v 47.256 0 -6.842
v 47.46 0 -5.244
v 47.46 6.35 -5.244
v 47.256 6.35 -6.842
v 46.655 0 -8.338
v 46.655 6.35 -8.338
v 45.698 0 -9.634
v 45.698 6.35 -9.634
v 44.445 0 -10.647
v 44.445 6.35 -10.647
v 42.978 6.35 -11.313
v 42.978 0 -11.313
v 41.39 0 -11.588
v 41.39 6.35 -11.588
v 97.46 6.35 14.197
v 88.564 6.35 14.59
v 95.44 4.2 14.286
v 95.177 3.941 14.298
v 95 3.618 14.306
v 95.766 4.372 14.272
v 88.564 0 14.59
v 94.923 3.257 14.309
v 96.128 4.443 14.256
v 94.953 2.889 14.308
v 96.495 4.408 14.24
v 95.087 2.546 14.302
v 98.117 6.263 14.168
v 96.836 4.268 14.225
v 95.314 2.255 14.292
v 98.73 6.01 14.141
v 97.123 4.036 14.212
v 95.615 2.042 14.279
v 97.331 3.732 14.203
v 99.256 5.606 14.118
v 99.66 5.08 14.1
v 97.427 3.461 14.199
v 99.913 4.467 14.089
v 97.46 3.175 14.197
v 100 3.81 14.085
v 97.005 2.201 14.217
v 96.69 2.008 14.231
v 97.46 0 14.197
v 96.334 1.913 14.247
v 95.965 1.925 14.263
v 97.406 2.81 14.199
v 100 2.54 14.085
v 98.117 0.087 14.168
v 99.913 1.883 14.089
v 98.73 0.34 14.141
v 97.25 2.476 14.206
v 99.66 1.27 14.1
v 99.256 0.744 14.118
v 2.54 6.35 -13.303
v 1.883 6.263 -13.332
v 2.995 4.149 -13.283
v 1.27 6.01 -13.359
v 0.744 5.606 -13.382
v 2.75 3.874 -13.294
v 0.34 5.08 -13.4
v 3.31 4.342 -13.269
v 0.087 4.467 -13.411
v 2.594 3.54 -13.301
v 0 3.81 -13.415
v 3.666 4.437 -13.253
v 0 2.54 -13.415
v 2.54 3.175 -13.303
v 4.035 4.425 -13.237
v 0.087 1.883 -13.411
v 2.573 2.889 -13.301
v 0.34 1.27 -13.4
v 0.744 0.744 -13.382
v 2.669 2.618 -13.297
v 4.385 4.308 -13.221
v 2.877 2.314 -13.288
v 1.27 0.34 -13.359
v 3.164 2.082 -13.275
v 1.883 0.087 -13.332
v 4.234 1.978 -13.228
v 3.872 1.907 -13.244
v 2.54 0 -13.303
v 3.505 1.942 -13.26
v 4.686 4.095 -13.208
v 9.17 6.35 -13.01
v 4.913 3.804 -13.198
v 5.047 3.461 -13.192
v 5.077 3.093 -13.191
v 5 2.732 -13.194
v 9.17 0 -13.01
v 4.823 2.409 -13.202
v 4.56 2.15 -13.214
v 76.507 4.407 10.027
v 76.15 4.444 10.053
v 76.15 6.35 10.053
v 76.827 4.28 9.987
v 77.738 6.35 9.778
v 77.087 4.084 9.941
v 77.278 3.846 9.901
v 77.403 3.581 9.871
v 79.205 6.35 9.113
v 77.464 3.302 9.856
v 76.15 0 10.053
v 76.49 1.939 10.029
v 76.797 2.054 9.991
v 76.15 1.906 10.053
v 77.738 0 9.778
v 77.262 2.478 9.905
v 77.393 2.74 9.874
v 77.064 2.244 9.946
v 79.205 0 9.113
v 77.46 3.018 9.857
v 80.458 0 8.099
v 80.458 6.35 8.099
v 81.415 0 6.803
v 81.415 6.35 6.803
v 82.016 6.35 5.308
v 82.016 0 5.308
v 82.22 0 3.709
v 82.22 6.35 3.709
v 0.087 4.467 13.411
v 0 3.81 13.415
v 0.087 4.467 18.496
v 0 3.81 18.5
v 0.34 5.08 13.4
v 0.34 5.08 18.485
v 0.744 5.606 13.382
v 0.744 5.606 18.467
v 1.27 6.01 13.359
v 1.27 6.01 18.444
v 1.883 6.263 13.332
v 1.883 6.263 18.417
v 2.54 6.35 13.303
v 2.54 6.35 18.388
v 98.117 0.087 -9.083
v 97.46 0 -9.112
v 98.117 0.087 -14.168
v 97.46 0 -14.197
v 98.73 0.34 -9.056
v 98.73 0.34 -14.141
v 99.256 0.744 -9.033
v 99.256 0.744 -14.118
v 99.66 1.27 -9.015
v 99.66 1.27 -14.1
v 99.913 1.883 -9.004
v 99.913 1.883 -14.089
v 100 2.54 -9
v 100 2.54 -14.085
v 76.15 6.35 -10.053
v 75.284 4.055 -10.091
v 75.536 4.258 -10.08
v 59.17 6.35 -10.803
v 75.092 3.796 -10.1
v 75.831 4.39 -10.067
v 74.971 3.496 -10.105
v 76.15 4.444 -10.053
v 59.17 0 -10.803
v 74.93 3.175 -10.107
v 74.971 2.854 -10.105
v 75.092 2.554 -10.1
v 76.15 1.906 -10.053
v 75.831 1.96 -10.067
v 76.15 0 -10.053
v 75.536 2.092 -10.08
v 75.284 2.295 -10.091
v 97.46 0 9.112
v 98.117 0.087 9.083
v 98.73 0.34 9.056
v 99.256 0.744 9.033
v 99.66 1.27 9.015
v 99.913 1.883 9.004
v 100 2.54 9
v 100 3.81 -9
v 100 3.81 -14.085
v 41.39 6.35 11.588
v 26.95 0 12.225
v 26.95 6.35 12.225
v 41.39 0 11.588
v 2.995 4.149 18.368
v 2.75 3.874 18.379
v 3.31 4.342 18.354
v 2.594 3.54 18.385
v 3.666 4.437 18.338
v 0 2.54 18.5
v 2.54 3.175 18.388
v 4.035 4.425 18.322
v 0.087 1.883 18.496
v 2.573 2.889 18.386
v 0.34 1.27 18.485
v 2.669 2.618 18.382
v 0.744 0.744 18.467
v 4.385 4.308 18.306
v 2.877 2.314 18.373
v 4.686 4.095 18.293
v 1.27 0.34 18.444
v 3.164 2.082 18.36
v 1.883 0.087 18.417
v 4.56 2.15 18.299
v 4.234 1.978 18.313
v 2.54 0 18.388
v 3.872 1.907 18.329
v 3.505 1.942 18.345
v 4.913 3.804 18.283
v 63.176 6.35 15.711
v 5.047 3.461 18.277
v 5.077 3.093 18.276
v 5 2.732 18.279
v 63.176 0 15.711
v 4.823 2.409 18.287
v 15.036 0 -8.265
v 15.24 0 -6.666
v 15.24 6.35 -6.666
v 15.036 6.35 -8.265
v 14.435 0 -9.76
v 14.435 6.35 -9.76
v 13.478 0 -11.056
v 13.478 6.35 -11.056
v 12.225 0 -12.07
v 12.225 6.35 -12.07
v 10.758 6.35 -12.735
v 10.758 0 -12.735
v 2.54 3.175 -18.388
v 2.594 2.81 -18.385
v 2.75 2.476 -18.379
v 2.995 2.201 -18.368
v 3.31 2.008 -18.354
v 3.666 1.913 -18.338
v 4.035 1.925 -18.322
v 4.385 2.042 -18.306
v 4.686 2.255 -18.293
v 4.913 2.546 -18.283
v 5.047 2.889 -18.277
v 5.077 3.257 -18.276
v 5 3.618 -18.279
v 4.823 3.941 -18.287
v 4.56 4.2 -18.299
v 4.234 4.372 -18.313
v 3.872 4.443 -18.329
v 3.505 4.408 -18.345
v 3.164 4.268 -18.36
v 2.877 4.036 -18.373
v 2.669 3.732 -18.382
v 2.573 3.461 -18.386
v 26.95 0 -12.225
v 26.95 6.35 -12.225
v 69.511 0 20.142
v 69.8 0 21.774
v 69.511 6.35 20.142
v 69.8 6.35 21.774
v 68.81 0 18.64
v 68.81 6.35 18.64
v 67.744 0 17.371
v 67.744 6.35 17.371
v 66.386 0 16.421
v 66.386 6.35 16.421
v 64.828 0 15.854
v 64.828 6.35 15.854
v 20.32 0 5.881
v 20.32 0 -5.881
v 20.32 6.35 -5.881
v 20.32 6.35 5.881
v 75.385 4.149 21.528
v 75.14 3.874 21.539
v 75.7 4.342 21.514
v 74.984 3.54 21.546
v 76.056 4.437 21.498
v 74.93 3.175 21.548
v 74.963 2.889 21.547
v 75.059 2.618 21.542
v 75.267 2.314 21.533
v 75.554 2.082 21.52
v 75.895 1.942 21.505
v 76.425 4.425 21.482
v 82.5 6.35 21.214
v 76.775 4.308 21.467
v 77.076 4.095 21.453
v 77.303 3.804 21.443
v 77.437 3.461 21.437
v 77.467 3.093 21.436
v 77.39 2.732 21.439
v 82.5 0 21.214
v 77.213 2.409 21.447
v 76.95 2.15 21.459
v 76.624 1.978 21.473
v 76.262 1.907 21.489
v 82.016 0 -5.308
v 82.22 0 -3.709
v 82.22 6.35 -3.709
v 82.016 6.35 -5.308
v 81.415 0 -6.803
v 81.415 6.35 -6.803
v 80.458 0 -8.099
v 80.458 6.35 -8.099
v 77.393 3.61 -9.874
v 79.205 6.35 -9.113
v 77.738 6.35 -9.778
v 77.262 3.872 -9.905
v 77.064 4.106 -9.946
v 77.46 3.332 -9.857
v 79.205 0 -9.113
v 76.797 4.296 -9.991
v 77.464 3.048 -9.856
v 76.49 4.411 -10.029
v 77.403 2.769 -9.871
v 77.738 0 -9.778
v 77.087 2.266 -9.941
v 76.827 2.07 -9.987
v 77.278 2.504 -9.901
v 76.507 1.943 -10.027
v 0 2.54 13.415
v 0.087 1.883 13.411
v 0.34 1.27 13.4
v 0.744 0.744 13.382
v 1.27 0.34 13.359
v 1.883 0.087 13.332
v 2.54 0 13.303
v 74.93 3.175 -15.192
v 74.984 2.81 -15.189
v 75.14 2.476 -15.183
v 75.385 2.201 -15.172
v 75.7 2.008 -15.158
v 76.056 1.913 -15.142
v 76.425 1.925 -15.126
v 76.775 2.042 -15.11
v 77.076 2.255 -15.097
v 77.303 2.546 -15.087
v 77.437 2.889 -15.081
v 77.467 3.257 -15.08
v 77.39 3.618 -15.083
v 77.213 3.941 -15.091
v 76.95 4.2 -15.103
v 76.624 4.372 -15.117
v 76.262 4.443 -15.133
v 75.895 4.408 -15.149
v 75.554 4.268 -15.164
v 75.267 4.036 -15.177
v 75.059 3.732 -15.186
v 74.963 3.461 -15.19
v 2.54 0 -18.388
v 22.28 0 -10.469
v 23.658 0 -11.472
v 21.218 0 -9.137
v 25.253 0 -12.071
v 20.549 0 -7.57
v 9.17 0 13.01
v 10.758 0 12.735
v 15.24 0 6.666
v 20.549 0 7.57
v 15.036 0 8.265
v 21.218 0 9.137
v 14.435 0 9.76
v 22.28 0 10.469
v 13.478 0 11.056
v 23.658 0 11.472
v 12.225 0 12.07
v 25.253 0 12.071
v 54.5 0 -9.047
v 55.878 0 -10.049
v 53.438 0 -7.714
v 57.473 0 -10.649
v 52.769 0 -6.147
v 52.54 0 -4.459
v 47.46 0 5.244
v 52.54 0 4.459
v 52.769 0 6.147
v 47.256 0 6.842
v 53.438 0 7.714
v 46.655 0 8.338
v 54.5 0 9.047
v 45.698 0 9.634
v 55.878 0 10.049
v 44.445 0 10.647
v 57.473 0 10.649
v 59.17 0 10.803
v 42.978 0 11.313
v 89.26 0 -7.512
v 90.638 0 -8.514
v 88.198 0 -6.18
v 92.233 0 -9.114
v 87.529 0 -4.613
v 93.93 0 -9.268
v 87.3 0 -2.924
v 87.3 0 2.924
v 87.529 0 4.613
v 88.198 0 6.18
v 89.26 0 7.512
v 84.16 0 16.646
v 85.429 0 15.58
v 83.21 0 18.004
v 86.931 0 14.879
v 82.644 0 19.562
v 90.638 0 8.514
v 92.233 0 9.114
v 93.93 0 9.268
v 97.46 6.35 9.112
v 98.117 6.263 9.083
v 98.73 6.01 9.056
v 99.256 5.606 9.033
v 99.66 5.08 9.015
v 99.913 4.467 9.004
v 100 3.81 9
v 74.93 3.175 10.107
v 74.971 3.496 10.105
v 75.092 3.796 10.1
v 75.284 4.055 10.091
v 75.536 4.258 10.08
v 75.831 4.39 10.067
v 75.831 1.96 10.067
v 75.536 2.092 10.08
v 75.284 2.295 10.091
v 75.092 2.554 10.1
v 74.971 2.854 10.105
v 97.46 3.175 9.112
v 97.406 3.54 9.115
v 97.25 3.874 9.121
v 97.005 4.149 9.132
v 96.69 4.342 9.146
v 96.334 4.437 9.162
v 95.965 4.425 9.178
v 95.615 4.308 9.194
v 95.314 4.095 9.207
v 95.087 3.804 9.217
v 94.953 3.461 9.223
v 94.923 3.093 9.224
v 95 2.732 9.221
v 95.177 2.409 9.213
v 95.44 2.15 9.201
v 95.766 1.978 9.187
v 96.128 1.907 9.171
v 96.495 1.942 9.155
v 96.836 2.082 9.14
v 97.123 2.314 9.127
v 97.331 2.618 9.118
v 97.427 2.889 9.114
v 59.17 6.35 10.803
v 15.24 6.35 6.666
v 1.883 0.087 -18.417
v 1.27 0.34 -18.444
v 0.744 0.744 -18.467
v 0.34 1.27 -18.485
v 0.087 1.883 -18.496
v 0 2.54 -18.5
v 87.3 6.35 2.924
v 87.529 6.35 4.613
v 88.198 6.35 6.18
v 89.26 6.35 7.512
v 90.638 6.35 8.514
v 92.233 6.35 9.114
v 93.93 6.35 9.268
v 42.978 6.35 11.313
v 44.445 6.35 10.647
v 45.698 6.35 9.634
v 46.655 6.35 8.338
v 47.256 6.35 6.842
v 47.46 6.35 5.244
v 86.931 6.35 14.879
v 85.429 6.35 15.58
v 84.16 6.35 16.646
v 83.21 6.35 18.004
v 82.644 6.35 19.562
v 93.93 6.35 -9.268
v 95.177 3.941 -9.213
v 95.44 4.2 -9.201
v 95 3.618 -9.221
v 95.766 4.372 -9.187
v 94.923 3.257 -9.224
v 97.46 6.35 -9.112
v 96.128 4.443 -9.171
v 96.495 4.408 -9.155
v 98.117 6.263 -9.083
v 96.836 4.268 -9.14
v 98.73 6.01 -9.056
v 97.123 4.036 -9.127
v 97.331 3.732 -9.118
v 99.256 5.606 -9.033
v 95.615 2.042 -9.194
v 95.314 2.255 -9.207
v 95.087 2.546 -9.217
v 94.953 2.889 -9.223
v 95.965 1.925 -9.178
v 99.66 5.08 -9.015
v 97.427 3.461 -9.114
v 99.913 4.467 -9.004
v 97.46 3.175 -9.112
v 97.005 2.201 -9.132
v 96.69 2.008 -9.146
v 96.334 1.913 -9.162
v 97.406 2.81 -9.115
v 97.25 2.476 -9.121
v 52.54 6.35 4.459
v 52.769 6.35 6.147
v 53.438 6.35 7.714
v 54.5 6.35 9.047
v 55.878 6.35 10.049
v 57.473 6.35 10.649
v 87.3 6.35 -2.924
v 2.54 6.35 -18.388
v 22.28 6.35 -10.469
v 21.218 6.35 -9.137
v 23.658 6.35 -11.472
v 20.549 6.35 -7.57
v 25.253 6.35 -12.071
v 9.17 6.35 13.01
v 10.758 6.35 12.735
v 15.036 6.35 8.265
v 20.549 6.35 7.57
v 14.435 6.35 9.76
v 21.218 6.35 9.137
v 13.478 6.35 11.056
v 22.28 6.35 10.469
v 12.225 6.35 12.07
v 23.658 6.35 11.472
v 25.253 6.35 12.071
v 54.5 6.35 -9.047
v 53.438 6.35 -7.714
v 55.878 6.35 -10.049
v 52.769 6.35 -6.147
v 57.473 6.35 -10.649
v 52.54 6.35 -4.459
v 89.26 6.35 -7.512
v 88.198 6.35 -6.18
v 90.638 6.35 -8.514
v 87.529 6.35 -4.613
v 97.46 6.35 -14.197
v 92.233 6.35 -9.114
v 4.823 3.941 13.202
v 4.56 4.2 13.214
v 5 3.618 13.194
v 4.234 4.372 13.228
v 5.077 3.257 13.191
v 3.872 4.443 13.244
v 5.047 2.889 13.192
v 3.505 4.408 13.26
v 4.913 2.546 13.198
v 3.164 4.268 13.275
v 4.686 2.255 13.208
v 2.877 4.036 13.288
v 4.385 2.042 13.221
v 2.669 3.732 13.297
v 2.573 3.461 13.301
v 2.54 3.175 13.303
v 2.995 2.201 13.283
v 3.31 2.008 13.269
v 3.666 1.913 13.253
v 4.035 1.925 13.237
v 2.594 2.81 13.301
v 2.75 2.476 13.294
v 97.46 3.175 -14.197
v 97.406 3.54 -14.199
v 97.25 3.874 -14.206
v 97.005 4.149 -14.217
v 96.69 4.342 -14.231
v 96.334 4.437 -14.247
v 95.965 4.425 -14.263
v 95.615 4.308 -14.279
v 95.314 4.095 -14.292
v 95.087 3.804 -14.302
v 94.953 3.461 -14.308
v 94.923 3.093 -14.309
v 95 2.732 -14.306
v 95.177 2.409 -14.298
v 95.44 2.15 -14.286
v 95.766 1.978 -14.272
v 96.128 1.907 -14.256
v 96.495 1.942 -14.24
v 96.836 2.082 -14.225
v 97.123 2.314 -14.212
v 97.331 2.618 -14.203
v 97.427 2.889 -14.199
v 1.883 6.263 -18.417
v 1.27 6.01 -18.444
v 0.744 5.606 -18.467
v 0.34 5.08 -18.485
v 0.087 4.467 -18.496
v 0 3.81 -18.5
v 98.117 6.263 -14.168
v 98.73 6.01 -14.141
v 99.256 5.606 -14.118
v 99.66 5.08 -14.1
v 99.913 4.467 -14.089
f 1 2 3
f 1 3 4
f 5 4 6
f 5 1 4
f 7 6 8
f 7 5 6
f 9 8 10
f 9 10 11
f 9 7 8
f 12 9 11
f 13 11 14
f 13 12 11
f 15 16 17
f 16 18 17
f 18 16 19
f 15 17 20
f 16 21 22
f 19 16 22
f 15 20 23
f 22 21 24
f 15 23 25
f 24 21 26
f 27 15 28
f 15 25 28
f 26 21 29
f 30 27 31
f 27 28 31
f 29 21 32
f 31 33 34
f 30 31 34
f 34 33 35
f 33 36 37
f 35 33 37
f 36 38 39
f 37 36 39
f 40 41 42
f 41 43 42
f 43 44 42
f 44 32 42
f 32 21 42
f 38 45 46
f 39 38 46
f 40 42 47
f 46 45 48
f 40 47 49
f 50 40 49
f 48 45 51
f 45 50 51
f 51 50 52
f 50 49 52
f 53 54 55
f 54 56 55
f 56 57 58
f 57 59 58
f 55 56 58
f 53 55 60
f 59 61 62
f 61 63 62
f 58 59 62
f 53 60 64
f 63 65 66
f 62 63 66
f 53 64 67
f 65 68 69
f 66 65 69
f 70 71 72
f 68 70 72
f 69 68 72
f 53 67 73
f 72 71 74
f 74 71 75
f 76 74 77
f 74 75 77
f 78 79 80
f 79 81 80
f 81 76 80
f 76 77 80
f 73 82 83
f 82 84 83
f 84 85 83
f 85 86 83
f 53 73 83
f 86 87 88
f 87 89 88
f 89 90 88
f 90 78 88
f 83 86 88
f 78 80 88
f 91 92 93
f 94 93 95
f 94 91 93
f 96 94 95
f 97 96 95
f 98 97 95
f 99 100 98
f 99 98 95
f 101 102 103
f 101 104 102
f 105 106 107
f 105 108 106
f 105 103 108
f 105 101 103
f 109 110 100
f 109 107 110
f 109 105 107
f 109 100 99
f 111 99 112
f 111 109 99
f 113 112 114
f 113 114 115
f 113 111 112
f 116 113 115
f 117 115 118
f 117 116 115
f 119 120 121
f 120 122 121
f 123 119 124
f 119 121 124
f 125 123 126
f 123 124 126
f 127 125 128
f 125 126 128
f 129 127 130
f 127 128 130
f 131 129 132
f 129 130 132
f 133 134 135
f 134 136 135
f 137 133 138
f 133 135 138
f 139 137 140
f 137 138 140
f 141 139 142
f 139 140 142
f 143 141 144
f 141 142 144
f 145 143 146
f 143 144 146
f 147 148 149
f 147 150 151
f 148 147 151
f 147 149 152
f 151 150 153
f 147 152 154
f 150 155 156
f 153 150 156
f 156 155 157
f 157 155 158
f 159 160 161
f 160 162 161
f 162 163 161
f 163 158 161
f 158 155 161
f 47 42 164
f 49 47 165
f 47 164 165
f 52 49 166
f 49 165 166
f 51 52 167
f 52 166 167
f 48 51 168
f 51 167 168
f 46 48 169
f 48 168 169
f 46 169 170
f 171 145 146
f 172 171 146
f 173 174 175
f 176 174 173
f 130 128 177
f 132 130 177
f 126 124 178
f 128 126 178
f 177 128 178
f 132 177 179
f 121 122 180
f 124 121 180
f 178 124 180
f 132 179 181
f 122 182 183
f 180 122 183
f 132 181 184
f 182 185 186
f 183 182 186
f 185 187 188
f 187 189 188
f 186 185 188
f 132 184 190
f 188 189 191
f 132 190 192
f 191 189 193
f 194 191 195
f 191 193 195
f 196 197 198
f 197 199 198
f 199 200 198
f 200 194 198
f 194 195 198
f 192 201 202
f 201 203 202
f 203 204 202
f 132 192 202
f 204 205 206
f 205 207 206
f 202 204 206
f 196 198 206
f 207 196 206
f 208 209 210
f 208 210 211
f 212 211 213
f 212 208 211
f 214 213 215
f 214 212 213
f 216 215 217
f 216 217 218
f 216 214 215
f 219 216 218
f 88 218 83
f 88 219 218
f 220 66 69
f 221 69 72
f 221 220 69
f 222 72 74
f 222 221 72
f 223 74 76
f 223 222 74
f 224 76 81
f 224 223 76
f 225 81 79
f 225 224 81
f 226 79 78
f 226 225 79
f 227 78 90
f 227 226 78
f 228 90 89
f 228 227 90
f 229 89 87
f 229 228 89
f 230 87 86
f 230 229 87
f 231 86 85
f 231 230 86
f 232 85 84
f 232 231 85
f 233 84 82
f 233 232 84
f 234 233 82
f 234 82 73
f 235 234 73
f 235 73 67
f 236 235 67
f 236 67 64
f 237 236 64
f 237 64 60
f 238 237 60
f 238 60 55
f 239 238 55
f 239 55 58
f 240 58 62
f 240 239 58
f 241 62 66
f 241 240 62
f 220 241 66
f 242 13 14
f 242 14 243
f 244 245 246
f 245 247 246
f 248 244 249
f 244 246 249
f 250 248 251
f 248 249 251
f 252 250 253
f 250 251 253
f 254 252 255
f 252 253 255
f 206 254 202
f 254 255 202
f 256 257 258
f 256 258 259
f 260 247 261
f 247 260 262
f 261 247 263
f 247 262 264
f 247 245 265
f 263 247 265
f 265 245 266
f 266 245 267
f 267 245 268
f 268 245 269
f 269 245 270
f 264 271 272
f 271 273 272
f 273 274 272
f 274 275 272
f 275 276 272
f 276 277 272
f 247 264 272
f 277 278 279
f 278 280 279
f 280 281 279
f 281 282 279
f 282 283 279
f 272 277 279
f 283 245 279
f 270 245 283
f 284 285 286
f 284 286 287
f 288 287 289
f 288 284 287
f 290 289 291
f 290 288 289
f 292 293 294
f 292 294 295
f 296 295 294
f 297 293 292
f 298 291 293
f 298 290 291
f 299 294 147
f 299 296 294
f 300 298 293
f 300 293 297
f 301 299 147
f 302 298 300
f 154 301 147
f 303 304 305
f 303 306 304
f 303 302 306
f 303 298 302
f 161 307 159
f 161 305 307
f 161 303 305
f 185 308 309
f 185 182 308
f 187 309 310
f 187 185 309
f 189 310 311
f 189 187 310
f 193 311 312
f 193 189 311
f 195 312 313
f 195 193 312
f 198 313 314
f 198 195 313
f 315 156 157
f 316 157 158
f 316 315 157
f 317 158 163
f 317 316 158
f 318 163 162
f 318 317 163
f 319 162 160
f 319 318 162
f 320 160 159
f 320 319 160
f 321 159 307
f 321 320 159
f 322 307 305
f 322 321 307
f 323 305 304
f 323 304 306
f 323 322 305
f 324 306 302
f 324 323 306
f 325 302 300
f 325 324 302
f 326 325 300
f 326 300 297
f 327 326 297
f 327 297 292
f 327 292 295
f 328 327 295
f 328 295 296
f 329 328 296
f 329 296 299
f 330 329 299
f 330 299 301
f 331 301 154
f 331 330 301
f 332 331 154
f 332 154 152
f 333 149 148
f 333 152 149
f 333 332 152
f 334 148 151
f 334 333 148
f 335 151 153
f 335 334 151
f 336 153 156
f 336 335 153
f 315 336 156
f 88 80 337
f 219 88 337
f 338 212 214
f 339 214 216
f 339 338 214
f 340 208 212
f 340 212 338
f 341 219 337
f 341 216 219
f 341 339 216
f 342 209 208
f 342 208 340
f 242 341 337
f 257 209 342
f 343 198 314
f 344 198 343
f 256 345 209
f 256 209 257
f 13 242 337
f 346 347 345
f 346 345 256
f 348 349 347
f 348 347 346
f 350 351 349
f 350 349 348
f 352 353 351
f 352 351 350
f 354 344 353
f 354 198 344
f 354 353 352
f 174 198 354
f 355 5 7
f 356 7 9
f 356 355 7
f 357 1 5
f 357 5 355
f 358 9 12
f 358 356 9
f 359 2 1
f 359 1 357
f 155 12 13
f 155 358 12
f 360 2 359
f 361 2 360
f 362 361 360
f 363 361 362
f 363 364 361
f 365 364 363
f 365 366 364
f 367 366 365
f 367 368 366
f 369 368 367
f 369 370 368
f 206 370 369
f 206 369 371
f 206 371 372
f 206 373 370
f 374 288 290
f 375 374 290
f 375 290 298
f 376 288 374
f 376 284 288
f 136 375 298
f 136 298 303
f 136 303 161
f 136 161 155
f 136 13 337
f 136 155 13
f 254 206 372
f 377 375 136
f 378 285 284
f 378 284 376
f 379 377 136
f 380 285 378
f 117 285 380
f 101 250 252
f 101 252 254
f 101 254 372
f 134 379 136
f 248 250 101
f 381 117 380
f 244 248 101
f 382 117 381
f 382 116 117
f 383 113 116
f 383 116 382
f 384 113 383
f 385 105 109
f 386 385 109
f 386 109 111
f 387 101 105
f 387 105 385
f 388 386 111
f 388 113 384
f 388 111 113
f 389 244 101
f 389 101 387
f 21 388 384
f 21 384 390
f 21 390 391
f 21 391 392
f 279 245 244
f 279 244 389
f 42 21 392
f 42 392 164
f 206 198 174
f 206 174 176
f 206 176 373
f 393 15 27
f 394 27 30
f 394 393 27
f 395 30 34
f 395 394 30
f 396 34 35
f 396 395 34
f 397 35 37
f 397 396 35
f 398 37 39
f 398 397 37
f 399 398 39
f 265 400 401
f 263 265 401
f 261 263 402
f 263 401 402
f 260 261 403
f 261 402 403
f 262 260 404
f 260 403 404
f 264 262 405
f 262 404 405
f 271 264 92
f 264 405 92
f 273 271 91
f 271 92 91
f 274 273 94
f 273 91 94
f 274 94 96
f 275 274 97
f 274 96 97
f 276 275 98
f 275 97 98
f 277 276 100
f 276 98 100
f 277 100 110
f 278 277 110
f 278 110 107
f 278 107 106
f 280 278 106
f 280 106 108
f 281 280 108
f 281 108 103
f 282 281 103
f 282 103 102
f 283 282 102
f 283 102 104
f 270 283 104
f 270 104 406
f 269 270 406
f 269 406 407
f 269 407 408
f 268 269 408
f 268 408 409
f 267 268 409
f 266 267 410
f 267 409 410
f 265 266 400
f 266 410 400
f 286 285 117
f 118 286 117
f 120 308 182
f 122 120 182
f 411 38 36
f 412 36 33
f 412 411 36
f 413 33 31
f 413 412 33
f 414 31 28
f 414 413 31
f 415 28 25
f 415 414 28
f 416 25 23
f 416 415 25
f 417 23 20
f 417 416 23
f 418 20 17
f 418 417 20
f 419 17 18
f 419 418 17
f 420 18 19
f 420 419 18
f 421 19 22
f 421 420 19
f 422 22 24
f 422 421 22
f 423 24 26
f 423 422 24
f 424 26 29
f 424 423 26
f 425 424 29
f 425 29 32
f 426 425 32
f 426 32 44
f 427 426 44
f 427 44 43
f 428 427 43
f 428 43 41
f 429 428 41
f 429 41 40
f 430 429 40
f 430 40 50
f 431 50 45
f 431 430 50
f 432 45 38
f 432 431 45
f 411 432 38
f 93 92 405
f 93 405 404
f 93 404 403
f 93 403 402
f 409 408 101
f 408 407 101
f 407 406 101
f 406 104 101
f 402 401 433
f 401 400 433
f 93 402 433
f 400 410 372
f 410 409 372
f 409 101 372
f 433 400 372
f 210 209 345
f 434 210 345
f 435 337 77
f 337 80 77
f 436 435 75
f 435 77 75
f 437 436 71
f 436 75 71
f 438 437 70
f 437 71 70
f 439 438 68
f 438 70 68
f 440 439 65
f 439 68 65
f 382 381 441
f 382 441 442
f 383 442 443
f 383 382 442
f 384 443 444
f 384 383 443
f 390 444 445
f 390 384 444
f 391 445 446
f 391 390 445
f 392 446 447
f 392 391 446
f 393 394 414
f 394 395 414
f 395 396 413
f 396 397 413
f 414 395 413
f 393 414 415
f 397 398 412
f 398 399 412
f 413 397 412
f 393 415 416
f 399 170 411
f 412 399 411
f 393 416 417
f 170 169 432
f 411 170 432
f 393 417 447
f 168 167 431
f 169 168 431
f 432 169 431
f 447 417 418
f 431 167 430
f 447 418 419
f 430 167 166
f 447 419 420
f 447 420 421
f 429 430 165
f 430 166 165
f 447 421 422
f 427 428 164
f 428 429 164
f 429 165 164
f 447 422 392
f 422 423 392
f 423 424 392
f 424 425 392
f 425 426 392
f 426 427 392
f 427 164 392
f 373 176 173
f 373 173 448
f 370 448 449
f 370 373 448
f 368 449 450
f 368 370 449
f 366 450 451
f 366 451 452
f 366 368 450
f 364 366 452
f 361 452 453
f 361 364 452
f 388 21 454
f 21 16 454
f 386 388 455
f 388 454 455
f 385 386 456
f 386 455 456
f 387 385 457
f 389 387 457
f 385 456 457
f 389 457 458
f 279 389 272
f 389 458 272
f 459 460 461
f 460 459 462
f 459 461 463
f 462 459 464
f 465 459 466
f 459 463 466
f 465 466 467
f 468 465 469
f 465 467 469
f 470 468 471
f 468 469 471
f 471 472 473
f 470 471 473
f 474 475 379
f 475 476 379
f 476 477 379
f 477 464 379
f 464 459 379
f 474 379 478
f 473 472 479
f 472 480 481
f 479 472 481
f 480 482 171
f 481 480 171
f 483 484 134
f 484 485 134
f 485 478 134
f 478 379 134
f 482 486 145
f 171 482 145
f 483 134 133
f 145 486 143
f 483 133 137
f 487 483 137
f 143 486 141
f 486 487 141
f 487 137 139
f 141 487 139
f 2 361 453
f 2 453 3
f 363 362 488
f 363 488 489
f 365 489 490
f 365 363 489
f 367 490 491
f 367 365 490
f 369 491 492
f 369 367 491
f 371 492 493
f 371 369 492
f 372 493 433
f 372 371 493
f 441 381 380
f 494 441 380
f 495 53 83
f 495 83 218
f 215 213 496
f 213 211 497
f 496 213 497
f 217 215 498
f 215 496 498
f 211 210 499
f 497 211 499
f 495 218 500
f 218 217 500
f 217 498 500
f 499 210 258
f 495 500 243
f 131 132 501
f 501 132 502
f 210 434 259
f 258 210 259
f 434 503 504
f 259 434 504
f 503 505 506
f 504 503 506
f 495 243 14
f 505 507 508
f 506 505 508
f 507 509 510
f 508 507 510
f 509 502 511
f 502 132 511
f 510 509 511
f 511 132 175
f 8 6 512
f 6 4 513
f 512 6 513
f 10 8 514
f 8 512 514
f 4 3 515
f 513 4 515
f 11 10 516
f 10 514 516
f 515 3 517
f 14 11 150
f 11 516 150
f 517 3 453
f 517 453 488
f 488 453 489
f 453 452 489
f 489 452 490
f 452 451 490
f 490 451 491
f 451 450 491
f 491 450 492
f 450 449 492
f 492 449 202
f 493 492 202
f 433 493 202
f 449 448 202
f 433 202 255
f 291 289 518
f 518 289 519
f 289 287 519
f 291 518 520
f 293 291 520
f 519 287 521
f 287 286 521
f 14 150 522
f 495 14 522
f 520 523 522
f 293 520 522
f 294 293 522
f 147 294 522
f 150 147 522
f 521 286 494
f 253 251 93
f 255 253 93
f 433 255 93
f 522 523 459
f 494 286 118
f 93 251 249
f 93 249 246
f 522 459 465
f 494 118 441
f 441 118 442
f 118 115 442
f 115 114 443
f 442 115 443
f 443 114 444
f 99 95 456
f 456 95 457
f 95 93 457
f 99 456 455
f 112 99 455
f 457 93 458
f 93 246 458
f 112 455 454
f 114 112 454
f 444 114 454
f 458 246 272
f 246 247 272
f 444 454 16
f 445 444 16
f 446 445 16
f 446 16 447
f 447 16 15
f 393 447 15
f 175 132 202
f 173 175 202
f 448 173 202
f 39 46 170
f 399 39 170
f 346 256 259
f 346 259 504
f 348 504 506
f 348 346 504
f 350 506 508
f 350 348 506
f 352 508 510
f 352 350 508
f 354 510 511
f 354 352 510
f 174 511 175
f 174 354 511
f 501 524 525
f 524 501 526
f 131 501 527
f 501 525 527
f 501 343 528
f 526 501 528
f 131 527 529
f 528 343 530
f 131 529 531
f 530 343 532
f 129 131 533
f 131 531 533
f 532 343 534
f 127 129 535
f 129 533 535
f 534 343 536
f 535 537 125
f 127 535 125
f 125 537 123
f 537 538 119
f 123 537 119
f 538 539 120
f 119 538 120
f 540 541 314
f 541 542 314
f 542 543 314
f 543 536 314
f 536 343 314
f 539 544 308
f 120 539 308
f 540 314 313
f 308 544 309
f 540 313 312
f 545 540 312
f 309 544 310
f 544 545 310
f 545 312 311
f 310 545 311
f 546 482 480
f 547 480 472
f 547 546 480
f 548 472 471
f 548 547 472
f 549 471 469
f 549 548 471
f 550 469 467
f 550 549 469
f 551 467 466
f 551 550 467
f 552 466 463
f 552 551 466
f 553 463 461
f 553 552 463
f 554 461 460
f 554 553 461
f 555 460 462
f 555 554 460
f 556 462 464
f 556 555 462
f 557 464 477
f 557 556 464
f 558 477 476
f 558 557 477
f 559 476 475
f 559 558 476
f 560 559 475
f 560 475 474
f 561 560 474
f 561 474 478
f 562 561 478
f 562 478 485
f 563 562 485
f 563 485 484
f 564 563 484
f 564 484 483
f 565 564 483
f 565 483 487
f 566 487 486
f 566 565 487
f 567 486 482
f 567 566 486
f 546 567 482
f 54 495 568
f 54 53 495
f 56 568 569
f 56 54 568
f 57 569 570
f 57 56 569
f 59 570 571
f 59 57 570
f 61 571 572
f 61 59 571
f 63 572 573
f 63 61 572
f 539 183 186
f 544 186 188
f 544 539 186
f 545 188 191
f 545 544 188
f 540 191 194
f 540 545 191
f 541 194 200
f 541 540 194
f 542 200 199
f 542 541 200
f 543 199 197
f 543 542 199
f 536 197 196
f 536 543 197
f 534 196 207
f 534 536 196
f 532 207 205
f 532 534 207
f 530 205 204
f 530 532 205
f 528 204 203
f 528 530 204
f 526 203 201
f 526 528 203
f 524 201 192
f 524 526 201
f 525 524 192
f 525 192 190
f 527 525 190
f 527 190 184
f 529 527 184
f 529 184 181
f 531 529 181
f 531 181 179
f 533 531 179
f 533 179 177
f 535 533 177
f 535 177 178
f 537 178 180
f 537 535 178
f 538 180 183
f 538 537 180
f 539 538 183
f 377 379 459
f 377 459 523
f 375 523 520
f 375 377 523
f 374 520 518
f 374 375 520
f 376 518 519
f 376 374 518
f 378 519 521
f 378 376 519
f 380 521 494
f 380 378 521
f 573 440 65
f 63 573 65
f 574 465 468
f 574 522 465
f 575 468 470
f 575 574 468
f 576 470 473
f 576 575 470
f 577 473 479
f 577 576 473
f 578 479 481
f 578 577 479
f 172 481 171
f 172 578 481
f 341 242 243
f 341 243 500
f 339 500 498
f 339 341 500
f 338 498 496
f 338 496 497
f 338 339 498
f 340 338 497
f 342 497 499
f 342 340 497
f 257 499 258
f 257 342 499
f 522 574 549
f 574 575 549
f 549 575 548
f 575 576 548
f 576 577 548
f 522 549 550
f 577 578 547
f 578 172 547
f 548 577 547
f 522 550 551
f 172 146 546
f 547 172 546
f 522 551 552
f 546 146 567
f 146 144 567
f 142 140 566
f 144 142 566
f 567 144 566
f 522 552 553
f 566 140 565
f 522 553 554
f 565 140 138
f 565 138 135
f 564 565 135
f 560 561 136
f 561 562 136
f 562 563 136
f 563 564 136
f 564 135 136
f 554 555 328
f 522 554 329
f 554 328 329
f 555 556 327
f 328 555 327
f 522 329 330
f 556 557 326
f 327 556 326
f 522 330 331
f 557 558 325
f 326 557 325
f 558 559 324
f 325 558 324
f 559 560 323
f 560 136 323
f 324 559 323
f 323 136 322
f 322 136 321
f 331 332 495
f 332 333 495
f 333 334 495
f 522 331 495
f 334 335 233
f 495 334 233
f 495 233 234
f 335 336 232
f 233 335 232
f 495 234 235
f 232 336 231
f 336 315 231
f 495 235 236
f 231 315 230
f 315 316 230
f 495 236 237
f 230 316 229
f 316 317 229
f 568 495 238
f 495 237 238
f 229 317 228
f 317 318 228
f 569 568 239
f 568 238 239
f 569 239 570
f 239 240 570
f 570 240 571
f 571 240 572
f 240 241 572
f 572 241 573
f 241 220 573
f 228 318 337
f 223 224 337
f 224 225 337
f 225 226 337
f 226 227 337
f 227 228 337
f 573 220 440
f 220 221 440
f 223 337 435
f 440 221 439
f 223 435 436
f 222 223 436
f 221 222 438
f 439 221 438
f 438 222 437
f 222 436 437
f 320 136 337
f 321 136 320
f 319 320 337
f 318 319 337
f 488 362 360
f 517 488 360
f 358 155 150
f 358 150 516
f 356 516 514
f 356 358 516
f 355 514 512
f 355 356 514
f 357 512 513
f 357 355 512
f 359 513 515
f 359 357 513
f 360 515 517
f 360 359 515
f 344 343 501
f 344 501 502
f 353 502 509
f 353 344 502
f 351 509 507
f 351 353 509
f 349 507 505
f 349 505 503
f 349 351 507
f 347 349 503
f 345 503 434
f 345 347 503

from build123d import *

# Parameters (mm, degrees)
ARM_DEPTH               = 6.35
CUT_EXTRUDE1_DEPTH      = 103.539993784
CUT_EXTRUDE1_DEPTH_BACK = 103.539993784
SKETCH2_R               = 1.27
CUT_EXTRUDE2_DEPTH      = 103.539993784
CUT_EXTRUDE2_DEPTH_BACK = 103.539993784
SKETCH3_R               = 1.27
FILLET1_R               = 2.54
FILLET2_R               = 6.35
FILLET3_R               = 6.35


# Some blends are built 0.0001 mm under size
with BuildPart() as part:
    # Sketch1 → Arm (new body)
    with BuildSketch(Plane(origin=(0, 0, 0), x_dir=(1, 0, 0), z_dir=(0, 1, 0))):
        Polygon((0, -18.5), (69.52, -15.430656357), (69.80008291, -21.774476465), (82.50008291, -21.213764954), (82.22, -14.869944846), (100, -14.08494873), (100, -9), (87.3, -9.560711511), (87.3, 9.560711511), (100, 9), (100, 14.08494873), (0, 18.5), (0, 13.41505127), (15.24, 12.742197457), (15.24, -12.742197457), (0, -13.41505127), align=None)
        Polygon((82.22, -9.784996116), (52.54, -11.095383333), (52.54, 11.095383333), (82.22, 9.784996116), align=None, mode=Mode.SUBTRACT)
        Polygon((20.32, 12.517912852), (20.32, -12.517912852), (47.46, -11.319667937), (47.46, 11.319667937), align=None, mode=Mode.SUBTRACT)
    extrude(amount=ARM_DEPTH)

    # Sketch2 → Cut-Extrude1 (cut, two sides: drawn at the far end of the back side and taken through both)
    with BuildSketch(Plane.XY.offset(-CUT_EXTRUDE1_DEPTH_BACK)):
        with Locations(Location((76.2, 3.175, 0), (0, 0, 180))):
            Circle(SKETCH2_R)
    extrude(amount=CUT_EXTRUDE1_DEPTH + CUT_EXTRUDE1_DEPTH_BACK, mode=Mode.SUBTRACT)

    # Sketch3 → Cut-Extrude2 (cut, two sides: drawn at the far end of the back side and taken through both)
    with BuildSketch(Plane.XY.offset(-CUT_EXTRUDE2_DEPTH_BACK)):
        with Locations((96.19, 3.175)):
            Circle(SKETCH3_R)
        with Locations(Location((3.81, 3.175, 0), (0, 0, 180))):
            Circle(SKETCH3_R)
    extrude(amount=CUT_EXTRUDE2_DEPTH + CUT_EXTRUDE2_DEPTH_BACK, mode=Mode.SUBTRACT)

    # Fillet1
    fillet1_edges = [part.edges().sort_by_distance(p)[0] for p in [
        (0, 0, -15.957525635),
        (100, 0, -11.542474365),
        (100, 0, 11.542474365),
        (0, 0, 15.957525635),
        (100, 6.35, 11.542474365),
        (100, 6.35, -11.542474365),
        (0, 6.35, 15.957525635),
        (0, 6.35, -15.957525635),
    ]]
    fillet(fillet1_edges, radius=FILLET1_R)

    # Fillet2
    # the kernel refuses this fillet: 6.35 mm, written as the material it adds along each edge
    with BuildSketch(Plane(origin=(15.24, 0, 12.742197457), x_dir=(-0.999026788670257, 0, 0.04410754492367402), z_dir=(0, 1, 0)), Plane(origin=(15.24, 0, -12.742197457), x_dir=(0, 0, 1), z_dir=(0, 1, 0))) as fillet2_piece_1:
        with BuildLine():
            CenterArc((FILLET2_R * 0.95682364669, -FILLET2_R), FILLET2_R, 90, 87.472003686)
            Line((-FILLET2_R * 0.0422031419804, -FILLET2_R * 0.955892455076), (0, 0))
            Line((0, 0), (FILLET2_R * 0.95682364669, 0))
        make_face()
    extrude(amount=6.35)
    with BuildSketch(Plane(origin=(87.3, 0, 9.560711511), x_dir=(0.9990267886702568, 0, -0.04410754492367471), z_dir=(0, 1, 0)), Plane(origin=(52.54, 0, 11.095383333), x_dir=(0.9990267886702568, 0, -0.044107544923674566), z_dir=(0, 1, 0)), Plane(origin=(20.32, 0, 12.517912852), x_dir=(0.9990267886702568, 0, -0.044107544923674614), z_dir=(0, 1, 0)), Plane(origin=(87.3, 0, -9.560711511), x_dir=(0, 0, 1), z_dir=(0, 1, 0)), Plane(origin=(52.54, 0, -11.095383333), x_dir=(0, 0, 1), z_dir=(0, 1, 0))) as fillet2_piece_2:
        with BuildLine():
            CenterArc((FILLET2_R * 1.0451246721, FILLET2_R), FILLET2_R, 177.472003686, 92.527996314)
            Line((FILLET2_R * 0.0460978834253, FILLET2_R * 1.04410754492), (0, 0))
            Line((0, 0), (FILLET2_R * 1.0451246721, 0))
        make_face()
    extrude(amount=6.35)
    with BuildSketch(Plane(origin=(47.46, 0, 11.319667937), x_dir=(0, 0, -1), z_dir=(0, 1, 0)), Plane(origin=(47.46, 0, -11.319667937), x_dir=(-0.9990267886702568, 0, -0.04410754492367462), z_dir=(0, 1, 0))) as fillet2_piece_3:
        with BuildLine():
            CenterArc((FILLET2_R * 0.95682364669, FILLET2_R), FILLET2_R, 182.527996314, 87.472003686)
            Line((-FILLET2_R * 0.0422031419804, FILLET2_R * 0.955892455076), (0, 0))
            Line((0, 0), (FILLET2_R * 0.95682364669, 0))
        make_face()
    extrude(amount=6.35)
    with BuildSketch(Plane(origin=(20.32, 0, -12.517912852), x_dir=(0.9990267886702568, 0, 0.044107544923674594), z_dir=(0, 1, 0))) as fillet2_piece_4:
        with BuildLine():
            CenterArc((FILLET2_R * 1.0451246721, -FILLET2_R), FILLET2_R, 90, 92.527996314)
            Line((FILLET2_R * 0.0460978834253, -FILLET2_R * 1.04410754492), (0, 0))
            Line((0, 0), (FILLET2_R * 1.0451246721, 0))
        make_face()
    extrude(amount=6.35)
    with BuildSketch(Plane(origin=(82.22, 0, 9.784996116), x_dir=(-0.9990267886702568, 0, 0.04410754492367457), z_dir=(0, 1, 0))) as fillet2_piece_5_section:
        with BuildLine():
            CenterArc((FILLET2_R * 0.95682364669, -FILLET2_R), FILLET2_R, 90, 87.472003686)
            Line((-FILLET2_R * 0.0422031419804, -FILLET2_R * 0.955892455076), (0, 0))
            Line((0, 0), (FILLET2_R * 0.95682364669, 0))
        make_face()
    fillet2_piece_5 = extrude(amount=6.35, mode=Mode.PRIVATE)
    fillet2_piece_5 = fillet2_piece_5 - Plane(origin=(76.2, 3.175, 9.784996116), x_dir=(-1, 0, 0), z_dir=(0, 0, -1)) * Cylinder(1.27, 38, mode=Mode.PRIVATE)
    add(fillet2_piece_5)
    with BuildSketch(Plane(origin=(82.22, 0, -9.784996116), x_dir=(-0.9990267886702568, 0, -0.04410754492367478), z_dir=(0, 1, 0))) as fillet2_piece_6_section:
        with BuildLine():
            CenterArc((FILLET2_R * 0.95682364669, FILLET2_R), FILLET2_R, 182.527996314, 87.472003686)
            Line((-FILLET2_R * 0.0422031419804, FILLET2_R * 0.955892455076), (0, 0))
            Line((0, 0), (FILLET2_R * 0.95682364669, 0))
        make_face()
    fillet2_piece_6 = extrude(amount=6.35, mode=Mode.PRIVATE)
    fillet2_piece_6 = fillet2_piece_6 - Plane(origin=(76.2, 3.175, -9.784996116), x_dir=(-1, 0, 0), z_dir=(0, 0, 1)) * Cylinder(1.27, 38, mode=Mode.PRIVATE)
    add(fillet2_piece_6)

    # Fillet3
    fillet3_edges = [part.edges().sort_by_distance(p)[0] for p in [
        (69.52, 3.175, 15.430656357),
        (82.22, 3.175, 14.869944846),
    ]]
    fillet(fillet3_edges, radius=FILLET3_R - 0.0001)  # a hair under: the kernel refuses the full size


solid = part.part
